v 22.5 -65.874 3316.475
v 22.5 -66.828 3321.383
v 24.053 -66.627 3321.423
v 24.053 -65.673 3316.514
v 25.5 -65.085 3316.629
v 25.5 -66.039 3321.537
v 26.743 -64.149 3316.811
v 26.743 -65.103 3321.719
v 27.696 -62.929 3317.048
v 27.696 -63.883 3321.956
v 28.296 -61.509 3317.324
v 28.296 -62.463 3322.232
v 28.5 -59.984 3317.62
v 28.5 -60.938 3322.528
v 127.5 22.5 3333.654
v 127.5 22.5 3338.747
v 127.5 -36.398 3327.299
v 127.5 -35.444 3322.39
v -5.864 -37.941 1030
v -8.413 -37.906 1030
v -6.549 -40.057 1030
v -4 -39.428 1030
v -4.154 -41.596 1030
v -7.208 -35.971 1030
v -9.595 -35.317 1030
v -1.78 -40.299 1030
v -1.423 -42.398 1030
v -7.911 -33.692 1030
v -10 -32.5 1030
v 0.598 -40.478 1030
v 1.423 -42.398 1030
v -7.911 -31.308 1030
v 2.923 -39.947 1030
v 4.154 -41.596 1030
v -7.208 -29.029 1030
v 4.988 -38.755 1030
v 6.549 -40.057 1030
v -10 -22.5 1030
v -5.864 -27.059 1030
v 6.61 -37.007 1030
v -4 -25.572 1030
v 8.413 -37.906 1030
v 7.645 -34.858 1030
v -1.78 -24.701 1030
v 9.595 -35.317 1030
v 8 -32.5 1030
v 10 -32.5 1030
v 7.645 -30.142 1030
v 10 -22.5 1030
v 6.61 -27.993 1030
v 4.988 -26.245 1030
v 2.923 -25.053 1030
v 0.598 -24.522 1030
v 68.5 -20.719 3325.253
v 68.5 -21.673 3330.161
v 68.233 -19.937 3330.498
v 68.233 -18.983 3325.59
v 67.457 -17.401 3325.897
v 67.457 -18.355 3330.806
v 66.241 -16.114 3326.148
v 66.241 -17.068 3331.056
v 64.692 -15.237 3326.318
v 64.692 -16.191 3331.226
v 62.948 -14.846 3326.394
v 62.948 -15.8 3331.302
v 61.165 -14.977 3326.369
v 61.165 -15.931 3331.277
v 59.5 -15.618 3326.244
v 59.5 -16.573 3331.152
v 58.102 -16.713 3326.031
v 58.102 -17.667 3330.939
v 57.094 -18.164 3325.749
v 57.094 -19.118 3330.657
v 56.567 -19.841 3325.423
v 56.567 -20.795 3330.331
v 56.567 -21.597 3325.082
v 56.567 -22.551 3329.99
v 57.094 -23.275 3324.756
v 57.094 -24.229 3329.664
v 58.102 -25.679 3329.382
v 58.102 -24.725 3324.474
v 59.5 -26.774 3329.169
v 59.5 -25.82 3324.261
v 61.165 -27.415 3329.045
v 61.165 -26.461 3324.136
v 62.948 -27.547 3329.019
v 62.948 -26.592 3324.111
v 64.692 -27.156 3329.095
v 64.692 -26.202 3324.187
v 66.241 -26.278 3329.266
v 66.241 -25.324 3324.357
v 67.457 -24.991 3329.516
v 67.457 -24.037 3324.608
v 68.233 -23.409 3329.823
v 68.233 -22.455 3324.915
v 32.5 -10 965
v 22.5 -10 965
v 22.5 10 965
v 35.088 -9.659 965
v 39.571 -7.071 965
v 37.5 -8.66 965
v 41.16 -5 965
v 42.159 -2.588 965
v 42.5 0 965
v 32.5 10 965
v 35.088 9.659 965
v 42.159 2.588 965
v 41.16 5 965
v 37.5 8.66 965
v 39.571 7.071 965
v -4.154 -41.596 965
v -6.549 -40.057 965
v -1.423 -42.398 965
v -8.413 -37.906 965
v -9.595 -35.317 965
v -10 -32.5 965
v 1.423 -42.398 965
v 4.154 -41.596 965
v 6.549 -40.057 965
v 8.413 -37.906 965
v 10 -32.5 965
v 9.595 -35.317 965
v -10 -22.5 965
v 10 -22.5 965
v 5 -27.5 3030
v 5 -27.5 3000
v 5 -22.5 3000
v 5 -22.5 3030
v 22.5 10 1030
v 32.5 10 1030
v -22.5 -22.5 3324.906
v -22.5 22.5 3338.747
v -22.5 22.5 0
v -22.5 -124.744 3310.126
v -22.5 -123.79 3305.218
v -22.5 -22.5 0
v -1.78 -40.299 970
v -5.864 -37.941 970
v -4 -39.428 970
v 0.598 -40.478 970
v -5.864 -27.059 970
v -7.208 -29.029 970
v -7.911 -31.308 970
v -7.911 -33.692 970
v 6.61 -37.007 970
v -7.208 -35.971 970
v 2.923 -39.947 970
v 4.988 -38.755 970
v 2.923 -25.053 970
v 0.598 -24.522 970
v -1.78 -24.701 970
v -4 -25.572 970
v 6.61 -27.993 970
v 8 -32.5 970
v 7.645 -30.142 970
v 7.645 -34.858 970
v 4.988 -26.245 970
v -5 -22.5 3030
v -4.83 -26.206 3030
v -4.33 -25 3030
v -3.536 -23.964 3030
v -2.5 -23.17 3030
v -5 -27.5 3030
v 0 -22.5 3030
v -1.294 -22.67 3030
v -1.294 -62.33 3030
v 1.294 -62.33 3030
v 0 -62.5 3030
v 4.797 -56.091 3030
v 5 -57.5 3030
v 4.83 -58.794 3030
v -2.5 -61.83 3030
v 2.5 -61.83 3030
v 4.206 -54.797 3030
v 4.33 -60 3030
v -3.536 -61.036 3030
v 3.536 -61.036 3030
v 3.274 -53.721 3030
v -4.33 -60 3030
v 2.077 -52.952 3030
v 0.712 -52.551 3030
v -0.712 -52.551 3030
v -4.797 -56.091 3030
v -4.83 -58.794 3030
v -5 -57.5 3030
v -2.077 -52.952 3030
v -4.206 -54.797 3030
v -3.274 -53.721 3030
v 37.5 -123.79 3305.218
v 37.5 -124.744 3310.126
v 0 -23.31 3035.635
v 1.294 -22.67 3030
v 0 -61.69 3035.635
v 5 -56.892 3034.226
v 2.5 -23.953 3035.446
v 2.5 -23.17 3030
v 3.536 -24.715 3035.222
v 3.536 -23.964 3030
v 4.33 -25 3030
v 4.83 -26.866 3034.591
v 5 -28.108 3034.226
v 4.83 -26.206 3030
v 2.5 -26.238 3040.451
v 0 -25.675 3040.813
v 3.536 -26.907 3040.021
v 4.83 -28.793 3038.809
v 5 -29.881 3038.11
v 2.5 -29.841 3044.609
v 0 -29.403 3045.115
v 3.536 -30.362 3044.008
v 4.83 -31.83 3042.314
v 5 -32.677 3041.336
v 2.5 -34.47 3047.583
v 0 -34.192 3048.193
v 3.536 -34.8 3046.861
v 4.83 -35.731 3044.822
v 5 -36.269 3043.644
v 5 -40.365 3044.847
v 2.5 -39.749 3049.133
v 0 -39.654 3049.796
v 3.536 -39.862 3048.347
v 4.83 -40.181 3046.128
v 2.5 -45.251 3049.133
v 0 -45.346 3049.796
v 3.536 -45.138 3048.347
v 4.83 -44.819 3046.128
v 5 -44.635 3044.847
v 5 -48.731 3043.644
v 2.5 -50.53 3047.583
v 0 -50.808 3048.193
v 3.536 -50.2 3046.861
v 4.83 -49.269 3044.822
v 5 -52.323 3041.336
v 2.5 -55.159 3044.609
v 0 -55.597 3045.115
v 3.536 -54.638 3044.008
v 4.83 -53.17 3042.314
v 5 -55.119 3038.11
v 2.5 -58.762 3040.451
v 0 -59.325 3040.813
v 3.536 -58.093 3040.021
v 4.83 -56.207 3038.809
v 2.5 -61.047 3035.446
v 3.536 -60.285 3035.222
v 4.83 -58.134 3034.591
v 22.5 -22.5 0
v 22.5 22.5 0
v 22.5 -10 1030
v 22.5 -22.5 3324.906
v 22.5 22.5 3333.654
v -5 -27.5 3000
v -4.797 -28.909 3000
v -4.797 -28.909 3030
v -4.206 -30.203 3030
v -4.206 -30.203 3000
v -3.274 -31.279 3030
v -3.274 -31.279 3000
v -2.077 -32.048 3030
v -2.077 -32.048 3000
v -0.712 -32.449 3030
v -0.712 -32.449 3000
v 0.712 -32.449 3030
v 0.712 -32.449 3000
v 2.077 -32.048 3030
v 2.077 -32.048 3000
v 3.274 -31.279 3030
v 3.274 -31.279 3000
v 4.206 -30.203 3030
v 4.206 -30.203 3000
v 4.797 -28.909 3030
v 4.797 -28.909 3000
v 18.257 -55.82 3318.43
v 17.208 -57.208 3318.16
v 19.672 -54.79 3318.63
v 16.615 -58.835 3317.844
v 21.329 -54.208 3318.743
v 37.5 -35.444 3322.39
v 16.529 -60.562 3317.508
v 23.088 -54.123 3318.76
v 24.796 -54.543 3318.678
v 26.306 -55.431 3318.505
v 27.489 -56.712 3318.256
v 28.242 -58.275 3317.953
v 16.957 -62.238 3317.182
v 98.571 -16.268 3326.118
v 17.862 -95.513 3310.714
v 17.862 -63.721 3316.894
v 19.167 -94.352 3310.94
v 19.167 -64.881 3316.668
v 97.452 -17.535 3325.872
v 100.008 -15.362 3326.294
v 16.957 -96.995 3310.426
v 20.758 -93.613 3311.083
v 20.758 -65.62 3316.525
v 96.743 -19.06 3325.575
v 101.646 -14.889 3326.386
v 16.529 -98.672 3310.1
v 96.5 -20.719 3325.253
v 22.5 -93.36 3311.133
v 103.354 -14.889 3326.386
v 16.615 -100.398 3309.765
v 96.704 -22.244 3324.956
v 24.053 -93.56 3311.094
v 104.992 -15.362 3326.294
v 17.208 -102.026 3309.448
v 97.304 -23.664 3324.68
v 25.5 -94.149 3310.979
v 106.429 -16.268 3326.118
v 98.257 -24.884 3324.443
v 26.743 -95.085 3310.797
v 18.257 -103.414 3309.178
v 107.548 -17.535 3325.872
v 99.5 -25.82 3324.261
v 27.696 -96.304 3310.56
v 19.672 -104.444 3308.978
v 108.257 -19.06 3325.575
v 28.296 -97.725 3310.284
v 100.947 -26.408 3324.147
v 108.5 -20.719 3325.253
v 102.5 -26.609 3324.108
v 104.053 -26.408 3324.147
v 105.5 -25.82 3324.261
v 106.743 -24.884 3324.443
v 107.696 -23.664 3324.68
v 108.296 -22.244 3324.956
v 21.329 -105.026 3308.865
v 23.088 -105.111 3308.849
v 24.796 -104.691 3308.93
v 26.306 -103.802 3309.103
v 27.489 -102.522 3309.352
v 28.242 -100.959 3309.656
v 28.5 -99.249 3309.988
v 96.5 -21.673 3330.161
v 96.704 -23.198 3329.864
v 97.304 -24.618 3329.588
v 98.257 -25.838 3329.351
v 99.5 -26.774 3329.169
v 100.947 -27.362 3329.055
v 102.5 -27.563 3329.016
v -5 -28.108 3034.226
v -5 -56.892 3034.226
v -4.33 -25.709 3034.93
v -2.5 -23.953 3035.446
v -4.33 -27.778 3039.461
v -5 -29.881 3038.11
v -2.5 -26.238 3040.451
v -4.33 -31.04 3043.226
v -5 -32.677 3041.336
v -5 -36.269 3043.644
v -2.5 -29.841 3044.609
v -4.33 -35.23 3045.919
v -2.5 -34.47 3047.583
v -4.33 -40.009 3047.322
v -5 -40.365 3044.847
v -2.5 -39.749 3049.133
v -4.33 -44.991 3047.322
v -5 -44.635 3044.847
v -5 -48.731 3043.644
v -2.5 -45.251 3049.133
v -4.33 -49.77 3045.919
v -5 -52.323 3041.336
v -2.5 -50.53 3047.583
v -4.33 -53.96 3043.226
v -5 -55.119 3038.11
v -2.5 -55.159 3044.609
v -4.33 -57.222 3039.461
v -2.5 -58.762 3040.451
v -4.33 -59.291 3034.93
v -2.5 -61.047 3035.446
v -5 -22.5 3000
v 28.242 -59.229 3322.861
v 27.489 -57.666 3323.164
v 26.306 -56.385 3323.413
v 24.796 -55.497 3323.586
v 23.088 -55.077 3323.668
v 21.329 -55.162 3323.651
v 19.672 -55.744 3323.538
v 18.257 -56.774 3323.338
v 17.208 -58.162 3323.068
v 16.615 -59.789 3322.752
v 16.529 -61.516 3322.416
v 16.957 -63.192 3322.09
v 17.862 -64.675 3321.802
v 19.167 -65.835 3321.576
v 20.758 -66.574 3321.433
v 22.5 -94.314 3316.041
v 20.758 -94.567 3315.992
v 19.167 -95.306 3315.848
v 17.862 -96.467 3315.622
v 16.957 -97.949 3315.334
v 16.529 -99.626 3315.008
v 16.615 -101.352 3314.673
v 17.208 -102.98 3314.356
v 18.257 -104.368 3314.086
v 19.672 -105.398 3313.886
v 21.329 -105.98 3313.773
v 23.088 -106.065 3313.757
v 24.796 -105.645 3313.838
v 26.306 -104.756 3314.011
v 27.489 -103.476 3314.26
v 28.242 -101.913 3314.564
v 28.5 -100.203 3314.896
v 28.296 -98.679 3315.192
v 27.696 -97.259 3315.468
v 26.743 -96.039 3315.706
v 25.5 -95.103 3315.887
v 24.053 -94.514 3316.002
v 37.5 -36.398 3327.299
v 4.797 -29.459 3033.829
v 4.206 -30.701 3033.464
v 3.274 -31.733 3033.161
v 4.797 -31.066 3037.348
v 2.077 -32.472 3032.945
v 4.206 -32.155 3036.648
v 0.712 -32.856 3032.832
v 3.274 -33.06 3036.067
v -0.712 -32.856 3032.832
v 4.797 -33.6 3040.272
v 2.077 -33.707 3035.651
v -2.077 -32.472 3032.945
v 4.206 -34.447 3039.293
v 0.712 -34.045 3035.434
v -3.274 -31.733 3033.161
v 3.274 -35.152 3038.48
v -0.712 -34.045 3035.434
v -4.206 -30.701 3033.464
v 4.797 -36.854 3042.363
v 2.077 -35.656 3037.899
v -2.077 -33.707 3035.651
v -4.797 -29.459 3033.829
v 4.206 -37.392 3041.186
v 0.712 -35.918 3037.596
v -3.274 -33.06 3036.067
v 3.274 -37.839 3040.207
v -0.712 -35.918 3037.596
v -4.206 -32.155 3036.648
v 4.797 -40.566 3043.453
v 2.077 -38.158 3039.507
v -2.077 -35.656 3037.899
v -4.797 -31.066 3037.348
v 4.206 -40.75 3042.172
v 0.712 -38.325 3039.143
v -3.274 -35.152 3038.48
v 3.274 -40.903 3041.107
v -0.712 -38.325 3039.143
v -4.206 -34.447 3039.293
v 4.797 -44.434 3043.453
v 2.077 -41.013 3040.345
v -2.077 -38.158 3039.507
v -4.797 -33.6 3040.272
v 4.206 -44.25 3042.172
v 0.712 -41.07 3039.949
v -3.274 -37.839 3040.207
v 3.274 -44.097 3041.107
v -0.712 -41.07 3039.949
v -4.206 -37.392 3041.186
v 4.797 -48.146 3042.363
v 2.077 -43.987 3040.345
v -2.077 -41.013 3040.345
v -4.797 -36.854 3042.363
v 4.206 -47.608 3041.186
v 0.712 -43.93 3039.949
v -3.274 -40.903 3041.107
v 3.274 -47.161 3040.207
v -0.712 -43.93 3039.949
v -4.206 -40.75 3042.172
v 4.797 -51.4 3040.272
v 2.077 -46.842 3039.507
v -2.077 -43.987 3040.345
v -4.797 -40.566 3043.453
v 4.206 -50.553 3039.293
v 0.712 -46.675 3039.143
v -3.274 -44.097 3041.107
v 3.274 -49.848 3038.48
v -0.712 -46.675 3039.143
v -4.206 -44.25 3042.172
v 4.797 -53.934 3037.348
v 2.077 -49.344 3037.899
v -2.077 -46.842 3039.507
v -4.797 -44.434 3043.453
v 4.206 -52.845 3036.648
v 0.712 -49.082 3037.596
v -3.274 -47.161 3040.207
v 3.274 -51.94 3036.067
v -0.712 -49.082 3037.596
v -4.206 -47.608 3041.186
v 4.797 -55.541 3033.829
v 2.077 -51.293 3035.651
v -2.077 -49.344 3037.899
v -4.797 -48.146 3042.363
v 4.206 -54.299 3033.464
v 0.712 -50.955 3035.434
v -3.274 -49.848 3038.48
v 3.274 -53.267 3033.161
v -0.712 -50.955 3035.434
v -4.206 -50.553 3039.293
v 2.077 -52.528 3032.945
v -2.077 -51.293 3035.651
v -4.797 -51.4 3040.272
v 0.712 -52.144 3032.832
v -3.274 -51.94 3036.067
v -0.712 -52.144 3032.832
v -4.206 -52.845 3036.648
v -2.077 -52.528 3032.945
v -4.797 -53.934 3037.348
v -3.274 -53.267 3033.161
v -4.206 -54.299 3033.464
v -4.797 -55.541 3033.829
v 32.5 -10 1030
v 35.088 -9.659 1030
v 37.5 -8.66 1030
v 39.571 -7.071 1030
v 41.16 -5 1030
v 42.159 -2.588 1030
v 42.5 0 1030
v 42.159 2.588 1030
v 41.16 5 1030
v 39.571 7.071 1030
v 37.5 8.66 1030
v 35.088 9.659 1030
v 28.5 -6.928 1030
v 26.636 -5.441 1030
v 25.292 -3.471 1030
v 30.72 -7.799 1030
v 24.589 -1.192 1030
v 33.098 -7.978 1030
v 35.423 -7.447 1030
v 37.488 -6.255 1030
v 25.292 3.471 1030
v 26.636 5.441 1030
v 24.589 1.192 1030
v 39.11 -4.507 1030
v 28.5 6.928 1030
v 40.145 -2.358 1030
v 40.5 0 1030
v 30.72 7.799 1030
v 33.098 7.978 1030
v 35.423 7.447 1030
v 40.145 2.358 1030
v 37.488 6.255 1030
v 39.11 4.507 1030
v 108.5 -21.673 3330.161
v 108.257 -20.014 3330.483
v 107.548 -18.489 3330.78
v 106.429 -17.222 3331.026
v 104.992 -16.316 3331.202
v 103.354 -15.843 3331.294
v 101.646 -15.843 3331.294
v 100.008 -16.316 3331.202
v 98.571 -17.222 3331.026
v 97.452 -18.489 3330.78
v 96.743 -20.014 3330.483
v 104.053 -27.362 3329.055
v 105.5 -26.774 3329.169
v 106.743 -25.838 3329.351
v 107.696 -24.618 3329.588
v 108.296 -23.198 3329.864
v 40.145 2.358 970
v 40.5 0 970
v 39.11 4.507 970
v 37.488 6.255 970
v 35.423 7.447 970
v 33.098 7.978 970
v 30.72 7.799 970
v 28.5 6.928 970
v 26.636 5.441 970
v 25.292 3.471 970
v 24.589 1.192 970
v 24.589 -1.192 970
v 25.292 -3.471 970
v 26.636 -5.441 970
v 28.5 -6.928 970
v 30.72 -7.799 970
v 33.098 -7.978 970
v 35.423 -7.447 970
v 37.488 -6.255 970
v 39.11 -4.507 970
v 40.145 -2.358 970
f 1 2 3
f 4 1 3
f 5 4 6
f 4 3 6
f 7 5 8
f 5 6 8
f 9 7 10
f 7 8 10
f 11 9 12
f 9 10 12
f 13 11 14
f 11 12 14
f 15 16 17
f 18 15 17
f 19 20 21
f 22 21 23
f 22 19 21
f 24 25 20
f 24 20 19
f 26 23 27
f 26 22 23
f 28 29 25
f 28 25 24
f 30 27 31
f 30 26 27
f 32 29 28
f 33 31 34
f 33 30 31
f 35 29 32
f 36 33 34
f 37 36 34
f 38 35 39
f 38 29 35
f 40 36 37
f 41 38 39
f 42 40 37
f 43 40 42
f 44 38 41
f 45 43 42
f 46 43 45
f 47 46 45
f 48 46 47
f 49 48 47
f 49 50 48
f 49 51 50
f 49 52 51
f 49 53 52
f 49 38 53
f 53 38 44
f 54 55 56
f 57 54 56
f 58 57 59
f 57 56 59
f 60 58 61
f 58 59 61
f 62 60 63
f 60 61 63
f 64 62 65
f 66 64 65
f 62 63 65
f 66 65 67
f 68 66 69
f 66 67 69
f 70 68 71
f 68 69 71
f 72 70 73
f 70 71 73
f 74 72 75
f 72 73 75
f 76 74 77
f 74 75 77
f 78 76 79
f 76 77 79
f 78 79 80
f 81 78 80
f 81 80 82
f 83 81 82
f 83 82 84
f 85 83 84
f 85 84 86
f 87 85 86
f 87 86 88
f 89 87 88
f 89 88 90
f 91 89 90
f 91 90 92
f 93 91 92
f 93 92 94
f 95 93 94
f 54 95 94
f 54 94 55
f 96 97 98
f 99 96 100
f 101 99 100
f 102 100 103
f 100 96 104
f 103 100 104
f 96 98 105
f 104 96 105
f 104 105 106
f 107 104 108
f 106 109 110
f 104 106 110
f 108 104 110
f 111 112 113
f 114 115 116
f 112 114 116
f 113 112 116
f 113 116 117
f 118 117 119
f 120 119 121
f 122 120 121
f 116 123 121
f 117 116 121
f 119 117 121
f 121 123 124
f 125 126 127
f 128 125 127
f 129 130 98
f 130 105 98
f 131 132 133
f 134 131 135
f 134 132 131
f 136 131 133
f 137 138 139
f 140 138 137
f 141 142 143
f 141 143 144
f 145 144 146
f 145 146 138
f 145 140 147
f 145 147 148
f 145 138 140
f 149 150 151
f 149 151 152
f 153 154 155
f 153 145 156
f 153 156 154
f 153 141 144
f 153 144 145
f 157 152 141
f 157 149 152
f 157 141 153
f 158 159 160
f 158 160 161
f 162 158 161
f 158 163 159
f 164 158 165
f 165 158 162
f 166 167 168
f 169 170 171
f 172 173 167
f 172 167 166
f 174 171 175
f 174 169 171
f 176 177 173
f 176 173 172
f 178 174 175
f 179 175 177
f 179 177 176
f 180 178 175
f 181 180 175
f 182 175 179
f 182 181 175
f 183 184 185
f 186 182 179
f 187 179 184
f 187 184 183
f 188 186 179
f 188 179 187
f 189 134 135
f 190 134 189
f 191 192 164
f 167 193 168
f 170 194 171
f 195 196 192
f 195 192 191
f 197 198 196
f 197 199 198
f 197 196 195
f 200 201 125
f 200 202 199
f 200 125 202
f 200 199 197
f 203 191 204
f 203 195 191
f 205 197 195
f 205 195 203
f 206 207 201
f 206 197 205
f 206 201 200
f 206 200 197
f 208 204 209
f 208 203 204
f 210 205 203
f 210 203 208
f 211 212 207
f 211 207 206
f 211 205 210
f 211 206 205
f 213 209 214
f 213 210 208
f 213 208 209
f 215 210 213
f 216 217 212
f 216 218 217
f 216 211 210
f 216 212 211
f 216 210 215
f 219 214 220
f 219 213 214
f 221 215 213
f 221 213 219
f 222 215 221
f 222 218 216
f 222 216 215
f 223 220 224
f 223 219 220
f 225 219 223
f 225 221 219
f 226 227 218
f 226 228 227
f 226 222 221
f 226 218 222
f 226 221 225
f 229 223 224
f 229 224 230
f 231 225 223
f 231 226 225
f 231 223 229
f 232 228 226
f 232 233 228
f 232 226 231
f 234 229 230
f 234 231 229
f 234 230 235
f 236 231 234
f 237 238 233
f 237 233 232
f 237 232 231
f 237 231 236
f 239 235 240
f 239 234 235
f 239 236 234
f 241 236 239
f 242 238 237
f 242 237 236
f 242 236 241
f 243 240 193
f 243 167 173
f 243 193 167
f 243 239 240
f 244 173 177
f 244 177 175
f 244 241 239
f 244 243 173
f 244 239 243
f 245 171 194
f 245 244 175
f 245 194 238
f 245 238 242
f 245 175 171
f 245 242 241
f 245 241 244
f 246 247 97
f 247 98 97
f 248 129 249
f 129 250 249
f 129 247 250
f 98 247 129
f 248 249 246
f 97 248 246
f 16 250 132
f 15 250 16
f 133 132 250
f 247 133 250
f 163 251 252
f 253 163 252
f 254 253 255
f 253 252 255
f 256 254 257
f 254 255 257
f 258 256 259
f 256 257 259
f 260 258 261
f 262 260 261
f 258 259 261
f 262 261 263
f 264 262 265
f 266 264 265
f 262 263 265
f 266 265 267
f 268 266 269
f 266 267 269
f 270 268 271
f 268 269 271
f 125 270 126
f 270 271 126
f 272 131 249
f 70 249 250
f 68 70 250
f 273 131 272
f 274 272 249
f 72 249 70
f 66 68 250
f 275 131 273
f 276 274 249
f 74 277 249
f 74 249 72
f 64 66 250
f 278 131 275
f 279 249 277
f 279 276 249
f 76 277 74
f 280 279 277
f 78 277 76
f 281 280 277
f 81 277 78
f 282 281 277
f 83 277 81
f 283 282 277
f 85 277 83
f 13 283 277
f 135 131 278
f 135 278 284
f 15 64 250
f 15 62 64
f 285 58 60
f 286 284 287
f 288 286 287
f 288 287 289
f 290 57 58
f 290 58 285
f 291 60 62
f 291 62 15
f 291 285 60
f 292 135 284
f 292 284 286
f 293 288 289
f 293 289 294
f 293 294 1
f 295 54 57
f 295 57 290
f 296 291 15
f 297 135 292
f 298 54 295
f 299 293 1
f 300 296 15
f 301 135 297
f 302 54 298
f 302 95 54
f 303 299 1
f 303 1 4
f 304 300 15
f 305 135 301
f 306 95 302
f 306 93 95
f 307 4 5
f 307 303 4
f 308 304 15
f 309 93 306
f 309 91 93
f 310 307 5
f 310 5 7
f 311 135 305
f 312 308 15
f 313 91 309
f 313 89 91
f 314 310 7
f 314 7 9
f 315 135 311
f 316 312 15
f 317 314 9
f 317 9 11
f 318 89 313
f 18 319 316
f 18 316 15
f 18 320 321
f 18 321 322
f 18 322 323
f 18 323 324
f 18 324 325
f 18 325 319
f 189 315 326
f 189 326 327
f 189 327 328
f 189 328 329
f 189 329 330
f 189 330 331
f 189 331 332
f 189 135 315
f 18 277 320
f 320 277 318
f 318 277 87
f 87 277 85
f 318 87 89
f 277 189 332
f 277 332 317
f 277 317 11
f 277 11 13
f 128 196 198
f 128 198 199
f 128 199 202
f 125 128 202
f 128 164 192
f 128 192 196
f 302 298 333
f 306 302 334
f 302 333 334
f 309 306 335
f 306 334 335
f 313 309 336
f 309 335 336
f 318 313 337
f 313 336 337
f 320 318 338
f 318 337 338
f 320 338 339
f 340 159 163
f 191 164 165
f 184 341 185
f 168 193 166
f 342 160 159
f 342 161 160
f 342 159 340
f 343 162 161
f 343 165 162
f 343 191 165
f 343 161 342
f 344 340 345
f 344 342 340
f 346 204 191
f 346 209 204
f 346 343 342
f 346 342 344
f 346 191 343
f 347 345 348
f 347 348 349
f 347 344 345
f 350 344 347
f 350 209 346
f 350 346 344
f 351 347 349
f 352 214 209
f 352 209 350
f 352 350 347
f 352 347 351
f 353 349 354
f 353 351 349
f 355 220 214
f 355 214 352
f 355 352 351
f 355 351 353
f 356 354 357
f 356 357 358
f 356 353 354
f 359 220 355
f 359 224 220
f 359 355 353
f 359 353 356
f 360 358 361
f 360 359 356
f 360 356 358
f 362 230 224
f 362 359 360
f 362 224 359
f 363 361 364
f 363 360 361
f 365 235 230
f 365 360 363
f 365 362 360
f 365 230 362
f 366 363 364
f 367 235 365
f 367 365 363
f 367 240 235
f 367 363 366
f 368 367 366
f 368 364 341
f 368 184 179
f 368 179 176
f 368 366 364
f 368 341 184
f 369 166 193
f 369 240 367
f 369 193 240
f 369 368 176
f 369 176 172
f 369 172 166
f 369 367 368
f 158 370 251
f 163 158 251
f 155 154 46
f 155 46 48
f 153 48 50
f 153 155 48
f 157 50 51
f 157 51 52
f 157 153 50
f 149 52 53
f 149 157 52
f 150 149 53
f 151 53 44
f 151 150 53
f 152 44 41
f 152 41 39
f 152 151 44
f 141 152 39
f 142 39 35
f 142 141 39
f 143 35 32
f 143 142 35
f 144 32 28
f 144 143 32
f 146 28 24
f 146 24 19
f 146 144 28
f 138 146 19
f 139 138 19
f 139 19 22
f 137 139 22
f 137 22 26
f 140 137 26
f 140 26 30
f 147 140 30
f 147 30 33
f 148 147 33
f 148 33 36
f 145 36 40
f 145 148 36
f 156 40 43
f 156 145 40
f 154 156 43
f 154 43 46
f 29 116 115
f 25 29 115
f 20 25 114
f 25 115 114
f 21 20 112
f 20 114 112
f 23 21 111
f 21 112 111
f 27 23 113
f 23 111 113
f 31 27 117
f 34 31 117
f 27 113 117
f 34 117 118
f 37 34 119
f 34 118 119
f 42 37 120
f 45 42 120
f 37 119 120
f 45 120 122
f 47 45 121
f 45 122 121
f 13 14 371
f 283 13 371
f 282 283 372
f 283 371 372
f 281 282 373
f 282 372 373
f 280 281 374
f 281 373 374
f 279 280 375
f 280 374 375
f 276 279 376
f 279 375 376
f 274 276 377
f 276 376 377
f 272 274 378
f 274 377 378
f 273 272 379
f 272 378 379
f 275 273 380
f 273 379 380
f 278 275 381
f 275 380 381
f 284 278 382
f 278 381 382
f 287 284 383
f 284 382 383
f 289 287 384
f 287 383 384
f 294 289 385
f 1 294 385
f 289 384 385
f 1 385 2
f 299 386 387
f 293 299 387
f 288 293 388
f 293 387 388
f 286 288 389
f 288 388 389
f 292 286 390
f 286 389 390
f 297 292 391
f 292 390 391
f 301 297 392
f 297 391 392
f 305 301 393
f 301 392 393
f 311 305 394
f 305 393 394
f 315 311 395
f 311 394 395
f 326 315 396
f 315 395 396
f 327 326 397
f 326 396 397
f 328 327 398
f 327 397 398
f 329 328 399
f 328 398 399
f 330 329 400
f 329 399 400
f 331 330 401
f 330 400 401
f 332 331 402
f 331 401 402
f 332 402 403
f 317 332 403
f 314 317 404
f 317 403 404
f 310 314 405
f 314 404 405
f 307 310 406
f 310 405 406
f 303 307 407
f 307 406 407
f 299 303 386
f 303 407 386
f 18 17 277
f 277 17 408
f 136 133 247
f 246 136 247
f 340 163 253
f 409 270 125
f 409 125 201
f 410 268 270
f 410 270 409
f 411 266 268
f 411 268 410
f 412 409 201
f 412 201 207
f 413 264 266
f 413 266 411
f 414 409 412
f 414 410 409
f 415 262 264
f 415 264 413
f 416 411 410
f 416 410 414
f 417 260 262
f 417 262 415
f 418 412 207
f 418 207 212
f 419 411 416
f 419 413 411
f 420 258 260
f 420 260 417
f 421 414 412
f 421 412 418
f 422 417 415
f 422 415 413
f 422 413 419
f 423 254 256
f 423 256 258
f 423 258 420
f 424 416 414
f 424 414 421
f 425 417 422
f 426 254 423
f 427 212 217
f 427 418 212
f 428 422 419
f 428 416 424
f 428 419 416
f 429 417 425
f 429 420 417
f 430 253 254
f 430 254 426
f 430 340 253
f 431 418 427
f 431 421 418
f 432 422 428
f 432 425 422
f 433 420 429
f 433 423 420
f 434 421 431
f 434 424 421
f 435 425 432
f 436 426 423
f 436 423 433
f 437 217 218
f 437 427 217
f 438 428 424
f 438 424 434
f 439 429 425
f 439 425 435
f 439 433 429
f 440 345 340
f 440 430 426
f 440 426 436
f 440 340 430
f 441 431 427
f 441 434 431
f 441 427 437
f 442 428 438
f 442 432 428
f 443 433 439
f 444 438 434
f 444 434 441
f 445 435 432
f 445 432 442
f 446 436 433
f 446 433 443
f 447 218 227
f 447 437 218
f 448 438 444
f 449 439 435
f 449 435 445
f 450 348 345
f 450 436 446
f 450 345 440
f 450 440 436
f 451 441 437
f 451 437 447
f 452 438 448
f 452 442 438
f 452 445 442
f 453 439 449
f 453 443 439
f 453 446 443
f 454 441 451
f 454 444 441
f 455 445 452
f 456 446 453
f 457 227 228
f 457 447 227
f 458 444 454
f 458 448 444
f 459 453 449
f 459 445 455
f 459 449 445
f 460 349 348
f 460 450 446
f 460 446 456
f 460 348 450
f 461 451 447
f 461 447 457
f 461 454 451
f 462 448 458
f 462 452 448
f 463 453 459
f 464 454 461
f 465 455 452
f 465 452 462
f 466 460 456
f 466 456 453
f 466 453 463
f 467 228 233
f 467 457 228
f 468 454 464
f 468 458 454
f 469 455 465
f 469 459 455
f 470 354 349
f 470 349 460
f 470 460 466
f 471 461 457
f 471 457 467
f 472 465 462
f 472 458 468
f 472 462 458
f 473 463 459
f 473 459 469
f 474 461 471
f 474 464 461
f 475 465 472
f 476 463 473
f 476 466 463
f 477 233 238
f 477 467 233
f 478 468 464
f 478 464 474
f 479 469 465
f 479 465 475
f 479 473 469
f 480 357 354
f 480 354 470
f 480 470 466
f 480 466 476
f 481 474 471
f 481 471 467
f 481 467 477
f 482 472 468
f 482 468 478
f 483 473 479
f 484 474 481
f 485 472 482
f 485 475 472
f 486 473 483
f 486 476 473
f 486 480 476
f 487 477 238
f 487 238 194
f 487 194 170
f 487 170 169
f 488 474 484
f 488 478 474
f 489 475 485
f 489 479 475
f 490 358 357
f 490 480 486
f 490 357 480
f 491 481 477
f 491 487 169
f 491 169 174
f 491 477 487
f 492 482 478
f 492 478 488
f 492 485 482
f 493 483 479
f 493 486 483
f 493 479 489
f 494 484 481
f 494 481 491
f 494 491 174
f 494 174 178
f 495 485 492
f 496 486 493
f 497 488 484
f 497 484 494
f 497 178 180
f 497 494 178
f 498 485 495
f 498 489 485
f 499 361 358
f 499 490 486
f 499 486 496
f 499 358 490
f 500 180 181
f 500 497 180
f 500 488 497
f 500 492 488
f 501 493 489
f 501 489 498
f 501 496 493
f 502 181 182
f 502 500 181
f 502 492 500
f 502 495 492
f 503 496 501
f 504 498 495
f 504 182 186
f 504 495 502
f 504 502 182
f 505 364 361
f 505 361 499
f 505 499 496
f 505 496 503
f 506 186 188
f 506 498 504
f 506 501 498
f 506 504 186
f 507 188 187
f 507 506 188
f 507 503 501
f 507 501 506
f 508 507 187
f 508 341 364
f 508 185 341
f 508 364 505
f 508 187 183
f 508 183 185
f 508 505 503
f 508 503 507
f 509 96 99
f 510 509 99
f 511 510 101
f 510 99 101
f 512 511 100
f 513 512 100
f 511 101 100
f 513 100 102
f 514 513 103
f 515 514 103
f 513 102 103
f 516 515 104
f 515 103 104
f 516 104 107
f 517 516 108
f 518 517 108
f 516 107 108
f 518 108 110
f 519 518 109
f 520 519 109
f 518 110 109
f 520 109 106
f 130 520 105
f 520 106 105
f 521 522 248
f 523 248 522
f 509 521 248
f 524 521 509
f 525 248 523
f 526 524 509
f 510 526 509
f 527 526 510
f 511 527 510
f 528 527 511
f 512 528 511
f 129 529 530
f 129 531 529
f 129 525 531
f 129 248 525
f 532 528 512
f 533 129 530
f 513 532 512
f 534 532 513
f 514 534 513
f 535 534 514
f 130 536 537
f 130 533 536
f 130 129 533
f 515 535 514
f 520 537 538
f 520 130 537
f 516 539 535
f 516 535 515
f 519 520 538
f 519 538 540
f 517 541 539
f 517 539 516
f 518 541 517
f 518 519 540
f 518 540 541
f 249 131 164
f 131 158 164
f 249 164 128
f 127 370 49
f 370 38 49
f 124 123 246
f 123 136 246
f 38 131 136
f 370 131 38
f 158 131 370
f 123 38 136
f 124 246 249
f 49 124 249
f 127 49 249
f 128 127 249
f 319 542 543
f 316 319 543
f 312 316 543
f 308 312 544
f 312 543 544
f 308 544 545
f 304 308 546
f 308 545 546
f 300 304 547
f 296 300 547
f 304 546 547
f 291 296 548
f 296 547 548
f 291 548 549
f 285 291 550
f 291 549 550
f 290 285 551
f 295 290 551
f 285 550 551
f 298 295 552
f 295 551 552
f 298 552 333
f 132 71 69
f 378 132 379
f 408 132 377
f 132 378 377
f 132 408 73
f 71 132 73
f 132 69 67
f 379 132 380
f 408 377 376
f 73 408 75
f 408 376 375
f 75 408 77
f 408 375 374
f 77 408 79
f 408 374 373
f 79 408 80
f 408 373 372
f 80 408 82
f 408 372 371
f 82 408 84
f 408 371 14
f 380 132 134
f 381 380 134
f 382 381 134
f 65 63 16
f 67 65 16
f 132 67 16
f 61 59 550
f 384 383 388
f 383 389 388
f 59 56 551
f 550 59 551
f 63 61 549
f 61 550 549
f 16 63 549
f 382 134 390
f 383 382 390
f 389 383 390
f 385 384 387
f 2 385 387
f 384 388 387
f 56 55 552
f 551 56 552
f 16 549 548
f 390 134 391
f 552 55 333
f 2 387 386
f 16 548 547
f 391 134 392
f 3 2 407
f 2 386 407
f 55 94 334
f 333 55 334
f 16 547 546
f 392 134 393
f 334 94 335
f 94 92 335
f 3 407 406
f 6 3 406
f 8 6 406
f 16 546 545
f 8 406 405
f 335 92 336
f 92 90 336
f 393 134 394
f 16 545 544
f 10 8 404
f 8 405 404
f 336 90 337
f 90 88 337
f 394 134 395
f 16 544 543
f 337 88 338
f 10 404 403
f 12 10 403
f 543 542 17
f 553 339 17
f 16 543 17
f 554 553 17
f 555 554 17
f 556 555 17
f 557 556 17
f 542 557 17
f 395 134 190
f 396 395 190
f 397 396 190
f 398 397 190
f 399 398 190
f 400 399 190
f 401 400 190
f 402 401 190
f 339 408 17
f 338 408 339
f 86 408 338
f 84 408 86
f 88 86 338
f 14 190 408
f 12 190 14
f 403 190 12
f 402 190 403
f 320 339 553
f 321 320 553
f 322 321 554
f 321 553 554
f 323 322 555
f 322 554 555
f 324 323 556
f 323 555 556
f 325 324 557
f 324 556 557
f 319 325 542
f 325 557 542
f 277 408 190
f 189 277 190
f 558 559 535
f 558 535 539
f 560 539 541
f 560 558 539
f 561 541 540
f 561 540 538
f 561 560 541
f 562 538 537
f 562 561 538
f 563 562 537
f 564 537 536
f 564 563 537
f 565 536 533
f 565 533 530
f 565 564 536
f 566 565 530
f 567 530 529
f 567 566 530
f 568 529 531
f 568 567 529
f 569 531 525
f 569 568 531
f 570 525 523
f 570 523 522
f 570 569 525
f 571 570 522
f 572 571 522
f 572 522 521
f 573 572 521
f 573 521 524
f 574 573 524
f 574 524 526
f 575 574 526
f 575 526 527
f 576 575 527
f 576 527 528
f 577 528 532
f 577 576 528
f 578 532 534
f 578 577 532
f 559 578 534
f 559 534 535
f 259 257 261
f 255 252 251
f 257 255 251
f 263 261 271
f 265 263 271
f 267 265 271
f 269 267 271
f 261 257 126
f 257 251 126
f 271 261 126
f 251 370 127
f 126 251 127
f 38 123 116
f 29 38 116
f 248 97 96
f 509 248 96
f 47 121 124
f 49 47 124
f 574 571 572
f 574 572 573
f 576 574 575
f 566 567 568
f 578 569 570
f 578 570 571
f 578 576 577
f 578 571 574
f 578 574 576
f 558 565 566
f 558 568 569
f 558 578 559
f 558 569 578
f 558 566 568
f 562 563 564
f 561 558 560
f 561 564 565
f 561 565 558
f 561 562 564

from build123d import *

# Parameters (mm, degrees)
F0_W      = 45
F0_H      = 45
F1_DEPTH  = 3330
F4_DEPTH  = 5
F5_R      = 8
F6_DEPTH  = 60
F9_W      = 45
F9_H      = 45.842251273
F10_DEPTH = 25
F11_W     = 60
F11_H     = 60
F11_W_2   = 90
F11_H_2   = 90
F12_DEPTH = 5
F13_R     = 6
F14_DEPTH = 25
F17_W     = 150
F17_H     = 4.7702248844
F18_DEPTH = 3358.6871623993
F19_DEPTH = 30


with BuildPart() as f1:
    # F0 (on Top) → F1 (new body)
    with BuildSketch(Plane.XY):
        Rectangle(F0_W, F0_H)
    extrude(amount=F1_DEPTH)

    # F3 (on offset) → F4 (join)
    with BuildSketch(Plane.XY.offset(965)):
        with BuildLine():
            ThreePointArc((2, -22.7020410289), (1.0050896201, -22.5506384699), (0, -22.5))
            Line((0, -22.5), (0, -32.5))
            Line((0, -32.5), (2, -32.5))
            Line((2, -32.5), (2, -22.7020410289))
        make_face()
        with BuildLine():
            Line((2, -22.5), (0, -22.5))
            ThreePointArc((0, -22.5), (1.0050896201, -22.5506384699), (2, -22.7020410289))
            Line((2, -22.7020410289), (2, -22.5))
        make_face()
        with BuildLine():
            Line((0, -32.5), (0, -22.5))
            ThreePointArc((0, -22.5), (-1.0050896201, -22.5506384699), (-2, -22.7020410289))
            Line((-2, -22.7020410289), (-2, -32.5))
            Line((-2, -32.5), (0, -32.5))
        make_face()
        with BuildLine():
            ThreePointArc((-2, -22.7020410289), (-1.0050896201, -22.5506384699), (0, -22.5))
            Line((0, -22.5), (-2, -22.5))
            Line((-2, -22.5), (-2, -22.7020410289))
        make_face()
        with BuildLine():
            Line((2, -32.5), (0, -32.5))
            Line((0, -32.5), (-2, -32.5))
            Line((-2, -32.5), (-2, -22.7020410289))
            ThreePointArc((-2, -22.7020410289), (-7.7459666924, -26.1754446797), (-10, -32.5))
            ThreePointArc((-10, -32.5), (0, -42.5), (10, -32.5))
            Line((10, -32.5), (2, -32.5))
        make_face()
        with BuildLine():
            Line((2, -22.5), (2, -22.7020410289))
            ThreePointArc((2, -22.7020410289), (7.7459666924, -26.1754446797), (10, -32.5))
            Line((10, -32.5), (10, -22.5))
            Line((10, -22.5), (2, -22.5))
        make_face()
        with BuildLine():
            ThreePointArc((10, -32.5), (7.7459666924, -26.1754446797), (2, -22.7020410289))
            Line((2, -22.7020410289), (2, -32.5))
            Line((2, -32.5), (10, -32.5))
        make_face()
        with BuildLine():
            ThreePointArc((-10, -32.5), (-7.7459666924, -26.1754446797), (-2, -22.7020410289))
            Line((-2, -22.7020410289), (-2, -22.5))
            Line((-2, -22.5), (-10, -22.5))
            Line((-10, -22.5), (-10, -32.5))
        make_face()
        with BuildLine():
            ThreePointArc((22.7020410289, 2), (22.5506384699, 1.0050896201), (22.5, 0))
            Line((22.5, 0), (32.5, 0))
            Line((32.5, 0), (32.5, 2))
            Line((32.5, 2), (22.7020410289, 2))
        make_face()
        with BuildLine():
            Line((22.5, 2), (22.5, 0))
            ThreePointArc((22.5, 0), (22.5506384699, 1.0050896201), (22.7020410289, 2))
            Line((22.7020410289, 2), (22.5, 2))
        make_face()
        with BuildLine():
            Line((32.5, 0), (22.5, 0))
            ThreePointArc((22.5, 0), (22.5506384699, -1.0050896201), (22.7020410289, -2))
            Line((22.7020410289, -2), (32.5, -2))
            Line((32.5, -2), (32.5, 0))
        make_face()
        with BuildLine():
            ThreePointArc((22.7020410289, -2), (22.5506384699, -1.0050896201), (22.5, 0))
            Line((22.5, 0), (22.5, -2))
            Line((22.5, -2), (22.7020410289, -2))
        make_face()
        with BuildLine():
            Line((32.5, 2), (32.5, 0))
            Line((32.5, 0), (32.5, -2))
            Line((32.5, -2), (32.5, -10))
            ThreePointArc((32.5, -10), (39.5710678119, -7.0710678119), (42.5, 0))
            ThreePointArc((42.5, 0), (39.5710678119, 7.0710678119), (32.5, 10))
            Line((32.5, 10), (32.5, 2))
        make_face()
        with BuildLine():
            Line((22.5, 2), (22.7020410289, 2))
            ThreePointArc((22.7020410289, 2), (26.1754446797, 7.7459666924), (32.5, 10))
            Line((32.5, 10), (22.5, 10))
            Line((22.5, 10), (22.5, 2))
        make_face()
        with BuildLine():
            ThreePointArc((32.5, 10), (26.1754446797, 7.7459666924), (22.7020410289, 2))
            Line((22.7020410289, 2), (32.5, 2))
            Line((32.5, 2), (32.5, 10))
        make_face()
        with BuildLine():
            Line((32.5, -2), (22.7020410289, -2))
            ThreePointArc((22.7020410289, -2), (26.1754446797, -7.7459666924), (32.5, -10))
            Line((32.5, -10), (32.5, -2))
        make_face()
        with BuildLine():
            ThreePointArc((32.5, -10), (26.1754446797, -7.7459666924), (22.7020410289, -2))
            Line((22.7020410289, -2), (22.5, -2))
            Line((22.5, -2), (22.5, -10))
            Line((22.5, -10), (32.5, -10))
        make_face()
    extrude(amount=F4_DEPTH)

    # F5 (on face) → F6 (join)
    with BuildSketch(Plane.XY.offset(970)):
        with BuildLine():
            ThreePointArc((32.5, -10), (39.5710678119, -7.0710678119), (42.5, 0))
            ThreePointArc((42.5, 0), (39.5710678119, 7.0710678119), (32.5, 10))
            ThreePointArc((32.5, 10), (25.4289321881, 7.0710678119), (22.5, 0))
            ThreePointArc((22.5, 0), (25.4289321881, -7.0710678119), (32.5, -10))
        make_face()
        with Locations((32.5, 0)):
            Circle(F5_R, mode=Mode.SUBTRACT)
        with BuildLine():
            ThreePointArc((22.5, 0), (25.4289321881, 7.0710678119), (32.5, 10))
            Line((32.5, 10), (22.5, 10))
            Line((22.5, 10), (22.5, 0))
        make_face()
        with BuildLine():
            Line((22.5, -10), (32.5, -10))
            ThreePointArc((32.5, -10), (25.4289321881, -7.0710678119), (22.5, 0))
            Line((22.5, 0), (22.5, -10))
        make_face()
        with BuildLine():
            ThreePointArc((0, -22.5), (-7.0710678119, -25.4289321881), (-10, -32.5))
            ThreePointArc((-10, -32.5), (0, -42.5), (10, -32.5))
            ThreePointArc((10, -32.5), (7.0710678119, -25.4289321881), (0, -22.5))
        make_face()
        with Locations((0, -32.5)):
            Circle(F5_R, mode=Mode.SUBTRACT)
        with BuildLine():
            Line((-10, -22.5), (-10, -32.5))
            ThreePointArc((-10, -32.5), (-7.0710678119, -25.4289321881), (0, -22.5))
            Line((0, -22.5), (-10, -22.5))
        make_face()
        with BuildLine():
            ThreePointArc((0, -22.5), (7.0710678119, -25.4289321881), (10, -32.5))
            Line((10, -32.5), (10, -22.5))
            Line((10, -22.5), (0, -22.5))
        make_face()
    extrude(amount=F6_DEPTH)

    # F9 (on face) → F10 (join)
    with BuildSketch(Plane(origin=(0, -624.5391596736, 3212.9754420296), x_dir=(1, 0, 0), z_dir=(0, 0.1908089954, -0.9816271834))):
        with Locations((0, -636.2284686128)):
            Rectangle(F9_W, F9_H)
    extrude(amount=F10_DEPTH)

    # F11 (on face) → F12 (join)
    with BuildSketch(Plane(origin=(0, -624.5391596736, 3212.9754420296), x_dir=(1, 0, 0), z_dir=(0, 0.1908089954, -0.9816271834))):
        with Locations((7.5, -629.1495942493)):
            Rectangle(F11_W, F11_H)
        with Locations((82.5, -629.1495942493)):
            Rectangle(F11_W_2, F11_H)
        with Locations((7.5, -554.1495942493)):
            Rectangle(F11_W, F11_H_2)
    extrude(amount=F12_DEPTH)

    # F13 (on face) → F14 (cut)
    with BuildSketch(Plane(origin=(0, -624.5391596736, 3212.9754420296), x_dir=(1, 0, 0), z_dir=(0, -0.1908089954, 0.9816271834))):
        with BuildLine():
            ThreePointArc((22.5, 540.1495942493), (18.2573593129, 529.9069535622), (28.5, 534.1495942493))
            Line((28.5, 534.1495942493), (22.5, 534.1495942493))
            Line((22.5, 534.1495942493), (22.5, 540.1495942493))
        make_face()
        with BuildLine():
            Line((22.5, 534.1495942493), (28.5, 534.1495942493))
            ThreePointArc((28.5, 534.1495942493), (26.7426406871, 538.3922349364), (22.5, 540.1495942493))
            Line((22.5, 540.1495942493), (22.5, 534.1495942493))
        make_face()
        with BuildLine():
            ThreePointArc((28.5, 574.1495942493), (18.2573593129, 578.3922349364), (22.5, 568.1495942493))
            ThreePointArc((22.5, 568.1495942493), (26.7426406871, 569.9069535622), (28.5, 574.1495942493))
        make_face()
        with BuildLine():
            ThreePointArc((96.5, 614.1495942493), (98.2573593129, 609.9069535622), (102.5, 608.1495942493))
            Line((102.5, 608.1495942493), (102.5, 614.1495942493))
            Line((102.5, 614.1495942493), (96.5, 614.1495942493))
        make_face()
        with Locations((62.5, 614.1495942493)):
            Circle(F13_R)
        with BuildLine():
            Line((102.5, 614.1495942493), (102.5, 608.1495942493))
            ThreePointArc((102.5, 608.1495942493), (106.7426406871, 609.9069535622), (108.5, 614.1495942493))
            ThreePointArc((108.5, 614.1495942493), (102.5, 620.1495942493), (96.5, 614.1495942493))
            Line((96.5, 614.1495942493), (102.5, 614.1495942493))
        make_face()
    extrude(amount=-F14_DEPTH, mode=Mode.SUBTRACT)

    # F17 (on Top) → F18 (cut)
    with BuildSketch(Plane.XY):
        with Locations((52.5, 24.8851124422)):
            Rectangle(F17_W, F17_H)
    extrude(amount=F18_DEPTH, mode=Mode.SUBTRACT)

    # F16 (on offset) → F19 (join)
    with BuildSketch(Plane.XY.offset(3000)):
        with BuildLine():
            ThreePointArc((-5, -27.5), (0, -32.5), (5, -27.5))
            ThreePointArc((5, -27.5), (3.5355339059, -23.9644660941), (0, -22.5))
            ThreePointArc((0, -22.5), (-3.5355339059, -23.9644660941), (-5, -27.5))
        make_face()
        with BuildLine():
            ThreePointArc((0, -22.5), (3.5355339059, -23.9644660941), (5, -27.5))
            Line((5, -27.5), (5, -22.5))
            Line((5, -22.5), (0, -22.5))
        make_face()
        with BuildLine():
            ThreePointArc((-5, -27.5), (-3.5355339059, -23.9644660941), (0, -22.5))
            Line((0, -22.5), (-5, -22.5))
            Line((-5, -22.5), (-5, -27.5))
        make_face()
    extrude(amount=F19_DEPTH)

    # F22: sweep along a path in F21
    with BuildLine(Plane.YZ) as f22_path:
        ThreePointArc((-27.5, 3030), (-42.5, 3045), (-57.5, 3030))
    # F20 (on face) → F22 (sweep)
    with BuildSketch(Plane.XY.offset(3030)):
        with BuildLine():
            ThreePointArc((0, -22.5), (-3.5355339059, -23.9644660941), (-5, -27.5))
            ThreePointArc((-5, -27.5), (0, -32.5), (5, -27.5))
            ThreePointArc((5, -27.5), (3.5355339059, -23.9644660941), (0, -22.5))
        make_face()
    sweep(path=f22_path.line)


solid = f1.part
